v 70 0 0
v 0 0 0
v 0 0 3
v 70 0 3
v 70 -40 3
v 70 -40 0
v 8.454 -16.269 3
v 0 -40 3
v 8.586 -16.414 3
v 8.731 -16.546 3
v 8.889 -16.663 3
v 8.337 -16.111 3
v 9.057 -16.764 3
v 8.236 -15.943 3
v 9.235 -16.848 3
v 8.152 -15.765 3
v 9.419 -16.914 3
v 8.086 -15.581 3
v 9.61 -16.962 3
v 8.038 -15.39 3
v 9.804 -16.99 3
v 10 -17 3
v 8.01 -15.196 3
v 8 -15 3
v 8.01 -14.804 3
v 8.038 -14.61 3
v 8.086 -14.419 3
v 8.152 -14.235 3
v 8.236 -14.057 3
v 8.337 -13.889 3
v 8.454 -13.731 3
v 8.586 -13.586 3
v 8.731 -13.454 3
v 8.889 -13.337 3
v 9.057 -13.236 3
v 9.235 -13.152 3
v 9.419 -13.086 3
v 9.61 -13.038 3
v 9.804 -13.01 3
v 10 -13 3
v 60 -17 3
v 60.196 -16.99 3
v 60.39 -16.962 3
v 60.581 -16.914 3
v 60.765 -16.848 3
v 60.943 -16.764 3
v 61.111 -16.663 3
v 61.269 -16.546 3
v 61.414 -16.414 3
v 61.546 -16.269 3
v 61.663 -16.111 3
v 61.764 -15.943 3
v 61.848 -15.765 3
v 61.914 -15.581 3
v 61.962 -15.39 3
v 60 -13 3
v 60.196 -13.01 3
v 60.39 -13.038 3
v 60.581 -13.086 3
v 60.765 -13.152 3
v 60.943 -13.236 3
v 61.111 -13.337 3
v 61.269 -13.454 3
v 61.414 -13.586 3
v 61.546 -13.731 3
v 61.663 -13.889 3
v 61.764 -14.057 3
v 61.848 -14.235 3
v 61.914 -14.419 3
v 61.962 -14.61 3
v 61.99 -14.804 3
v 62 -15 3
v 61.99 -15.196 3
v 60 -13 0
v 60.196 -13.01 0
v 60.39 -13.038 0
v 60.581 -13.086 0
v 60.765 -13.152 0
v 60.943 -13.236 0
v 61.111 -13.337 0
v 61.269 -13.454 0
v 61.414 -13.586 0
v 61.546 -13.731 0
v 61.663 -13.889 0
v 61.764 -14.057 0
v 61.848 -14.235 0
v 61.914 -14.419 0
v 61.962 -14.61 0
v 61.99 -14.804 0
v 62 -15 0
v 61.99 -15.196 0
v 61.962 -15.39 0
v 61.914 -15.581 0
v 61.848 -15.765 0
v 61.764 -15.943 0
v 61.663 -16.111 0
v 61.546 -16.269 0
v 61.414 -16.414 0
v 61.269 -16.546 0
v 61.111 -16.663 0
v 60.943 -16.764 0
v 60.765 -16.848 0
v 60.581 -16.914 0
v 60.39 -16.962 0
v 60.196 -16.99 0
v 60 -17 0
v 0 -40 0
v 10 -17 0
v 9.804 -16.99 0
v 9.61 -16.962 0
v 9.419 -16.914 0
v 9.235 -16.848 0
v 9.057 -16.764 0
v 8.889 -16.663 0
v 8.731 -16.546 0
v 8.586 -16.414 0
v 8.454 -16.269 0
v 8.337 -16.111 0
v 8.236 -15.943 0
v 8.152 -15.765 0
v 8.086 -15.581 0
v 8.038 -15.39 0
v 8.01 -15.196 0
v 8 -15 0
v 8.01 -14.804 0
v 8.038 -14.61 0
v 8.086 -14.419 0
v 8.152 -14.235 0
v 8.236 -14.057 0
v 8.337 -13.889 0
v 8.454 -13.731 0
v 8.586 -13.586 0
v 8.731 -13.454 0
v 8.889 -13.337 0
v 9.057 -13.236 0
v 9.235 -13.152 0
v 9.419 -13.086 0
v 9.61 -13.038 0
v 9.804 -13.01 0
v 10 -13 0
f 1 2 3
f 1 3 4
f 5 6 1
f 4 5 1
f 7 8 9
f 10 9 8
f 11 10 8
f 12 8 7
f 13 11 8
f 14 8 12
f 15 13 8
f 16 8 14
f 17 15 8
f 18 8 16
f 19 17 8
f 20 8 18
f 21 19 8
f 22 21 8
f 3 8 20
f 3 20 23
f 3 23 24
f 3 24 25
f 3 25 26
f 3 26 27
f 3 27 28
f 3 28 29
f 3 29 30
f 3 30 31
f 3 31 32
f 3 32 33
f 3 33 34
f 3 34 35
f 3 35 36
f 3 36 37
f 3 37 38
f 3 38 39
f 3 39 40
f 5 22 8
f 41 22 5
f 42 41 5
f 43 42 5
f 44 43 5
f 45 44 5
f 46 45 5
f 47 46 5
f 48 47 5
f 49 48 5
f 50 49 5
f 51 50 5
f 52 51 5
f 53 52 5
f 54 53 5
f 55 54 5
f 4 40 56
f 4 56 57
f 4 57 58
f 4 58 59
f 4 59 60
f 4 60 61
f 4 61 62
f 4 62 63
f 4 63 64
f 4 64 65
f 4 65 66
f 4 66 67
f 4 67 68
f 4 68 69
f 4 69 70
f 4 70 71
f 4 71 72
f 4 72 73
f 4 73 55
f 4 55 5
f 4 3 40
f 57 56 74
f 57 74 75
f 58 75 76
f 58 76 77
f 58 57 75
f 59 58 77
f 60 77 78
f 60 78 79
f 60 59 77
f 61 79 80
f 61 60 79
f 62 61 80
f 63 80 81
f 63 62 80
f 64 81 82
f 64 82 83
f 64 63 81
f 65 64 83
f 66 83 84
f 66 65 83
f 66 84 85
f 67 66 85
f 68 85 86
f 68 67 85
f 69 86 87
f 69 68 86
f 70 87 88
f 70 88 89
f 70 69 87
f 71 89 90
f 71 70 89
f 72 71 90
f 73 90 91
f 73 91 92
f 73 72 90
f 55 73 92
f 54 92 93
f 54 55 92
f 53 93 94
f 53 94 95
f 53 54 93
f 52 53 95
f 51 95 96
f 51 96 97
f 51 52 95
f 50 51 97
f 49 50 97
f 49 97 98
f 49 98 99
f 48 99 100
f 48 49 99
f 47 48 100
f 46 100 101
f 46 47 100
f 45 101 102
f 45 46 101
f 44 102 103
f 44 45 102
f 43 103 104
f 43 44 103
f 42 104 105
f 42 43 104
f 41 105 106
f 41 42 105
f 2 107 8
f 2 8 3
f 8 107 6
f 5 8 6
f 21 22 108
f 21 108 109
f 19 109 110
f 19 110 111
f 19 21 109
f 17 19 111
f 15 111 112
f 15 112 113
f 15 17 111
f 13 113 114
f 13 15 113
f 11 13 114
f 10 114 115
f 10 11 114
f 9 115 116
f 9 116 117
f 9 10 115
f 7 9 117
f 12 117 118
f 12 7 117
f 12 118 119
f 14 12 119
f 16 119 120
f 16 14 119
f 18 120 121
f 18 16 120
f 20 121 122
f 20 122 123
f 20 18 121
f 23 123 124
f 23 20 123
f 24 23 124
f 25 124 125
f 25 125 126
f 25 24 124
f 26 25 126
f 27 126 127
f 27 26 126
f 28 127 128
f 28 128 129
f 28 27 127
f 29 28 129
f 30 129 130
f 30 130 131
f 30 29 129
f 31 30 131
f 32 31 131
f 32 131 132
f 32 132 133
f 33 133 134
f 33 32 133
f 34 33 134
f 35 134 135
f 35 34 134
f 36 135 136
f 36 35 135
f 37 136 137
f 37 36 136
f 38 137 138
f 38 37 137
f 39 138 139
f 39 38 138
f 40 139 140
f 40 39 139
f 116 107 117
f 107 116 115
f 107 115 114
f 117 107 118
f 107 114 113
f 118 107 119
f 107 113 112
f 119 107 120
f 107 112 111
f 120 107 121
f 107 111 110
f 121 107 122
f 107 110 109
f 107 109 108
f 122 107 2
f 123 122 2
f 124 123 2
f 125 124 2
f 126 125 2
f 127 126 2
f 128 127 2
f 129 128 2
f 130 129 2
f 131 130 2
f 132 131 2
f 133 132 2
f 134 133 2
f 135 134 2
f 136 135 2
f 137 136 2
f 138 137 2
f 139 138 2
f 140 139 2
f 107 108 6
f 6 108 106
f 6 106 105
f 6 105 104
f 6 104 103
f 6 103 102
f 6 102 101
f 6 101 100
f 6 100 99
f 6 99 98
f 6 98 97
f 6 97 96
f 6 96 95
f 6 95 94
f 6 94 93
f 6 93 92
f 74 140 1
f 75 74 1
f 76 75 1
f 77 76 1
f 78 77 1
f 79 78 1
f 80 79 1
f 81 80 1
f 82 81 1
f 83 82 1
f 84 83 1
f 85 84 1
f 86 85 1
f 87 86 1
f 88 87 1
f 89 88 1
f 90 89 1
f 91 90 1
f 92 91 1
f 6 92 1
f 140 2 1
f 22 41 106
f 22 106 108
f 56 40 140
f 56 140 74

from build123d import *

# Parameters (mm, degrees)
SKETCH1_W           = 70
SKETCH1_H           = 40
BOSS_EXTRUDE1_DEPTH = 3
CUT_EXTRUDE1_DEPTH  = 3


with BuildPart() as part:
    # Sketch1 → Boss-Extrude1 (new body)
    with BuildSketch(Plane.XY):
        with Locations((35, -20)):
            Rectangle(SKETCH1_W, SKETCH1_H)
    extrude(amount=BOSS_EXTRUDE1_DEPTH)

    # Sketch2 → Cut-Extrude1 (cut)
    with BuildSketch(Plane.XY.offset(3)):
        with BuildLine():
            Line((10, -13), (60, -13))
            ThreePointArc((60, -13), (62, -15), (60, -17))
            Line((60, -17), (10, -17))
            ThreePointArc((10, -17), (8, -15), (10, -13))
        make_face()
    extrude(amount=-CUT_EXTRUDE1_DEPTH, mode=Mode.SUBTRACT)


solid = part.part
